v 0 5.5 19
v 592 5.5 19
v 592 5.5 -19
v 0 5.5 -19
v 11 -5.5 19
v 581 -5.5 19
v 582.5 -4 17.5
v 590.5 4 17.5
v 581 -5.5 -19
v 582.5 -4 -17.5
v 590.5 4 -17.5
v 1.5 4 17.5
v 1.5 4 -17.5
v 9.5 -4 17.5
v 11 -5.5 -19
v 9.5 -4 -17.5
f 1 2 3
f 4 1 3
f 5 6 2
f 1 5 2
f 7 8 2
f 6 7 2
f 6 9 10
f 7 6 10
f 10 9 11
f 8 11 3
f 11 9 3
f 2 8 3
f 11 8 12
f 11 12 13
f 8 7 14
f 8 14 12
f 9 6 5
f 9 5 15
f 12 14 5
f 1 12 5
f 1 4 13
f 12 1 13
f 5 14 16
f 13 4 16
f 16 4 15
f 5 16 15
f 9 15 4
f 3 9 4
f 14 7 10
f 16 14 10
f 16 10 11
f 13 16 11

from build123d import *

# Parameters (mm, degrees)
SKETCH1_W               = 38
SKETCH1_H               = 11
SKETCH1_W_2             = 35
SKETCH1_H_2             = 8
BOSS_EXTRUDE1_DEPTH     = 592
CUT_EXTRUDE1_DEPTH      = 1
CUT_EXTRUDE1_DEPTH_BACK = 39
CUT_EXTRUDE3_DEPTH      = 1
CUT_EXTRUDE3_DEPTH_BACK = 39


with BuildPart() as part:
    # Sketch1 → Boss-Extrude1 (new body)
    with BuildSketch(Plane(origin=(0, 0, 0), x_dir=(0, 0, -1), z_dir=(1, 0, 0))):
        Rectangle(SKETCH1_W, SKETCH1_H)
        Rectangle(SKETCH1_W_2, SKETCH1_H_2, mode=Mode.SUBTRACT)
    extrude(amount=BOSS_EXTRUDE1_DEPTH)

    # Sketch2 → Cut-Extrude1 (cut, two sides)
    with BuildSketch(Plane(origin=(0, 0, -19), x_dir=(-1, 0, 0), z_dir=(0, 0, -1))) as cut_extrude1_sk:
        Polygon((844.430011157, 849.930011157), (0, 5.5), (-11, -5.5), (-855.430011157, -849.930011157), (833.430011157, -2538.790033471), (2533.290033471, -838.930011157), align=None)
    extrude(amount=CUT_EXTRUDE1_DEPTH, mode=Mode.SUBTRACT)
    extrude(cut_extrude1_sk.sketch, amount=-CUT_EXTRUDE1_DEPTH_BACK, mode=Mode.SUBTRACT)

    # Sketch3 → Cut-Extrude3 (cut, two sides)
    with BuildSketch(Plane(origin=(0, 0, -19), x_dir=(-1, 0, 0), z_dir=(0, 0, -1))) as cut_extrude3_sk:
        Polygon((-1436.430011157, 849.930011157), (-592, 5.5), (-581, -5.5), (263.430011157, -849.930011157), (-1425.430011157, -2538.790033471), (-3125.290033471, -838.930011157), align=None)
    extrude(amount=CUT_EXTRUDE3_DEPTH, mode=Mode.SUBTRACT)
    extrude(cut_extrude3_sk.sketch, amount=-CUT_EXTRUDE3_DEPTH_BACK, mode=Mode.SUBTRACT)


solid = part.part
